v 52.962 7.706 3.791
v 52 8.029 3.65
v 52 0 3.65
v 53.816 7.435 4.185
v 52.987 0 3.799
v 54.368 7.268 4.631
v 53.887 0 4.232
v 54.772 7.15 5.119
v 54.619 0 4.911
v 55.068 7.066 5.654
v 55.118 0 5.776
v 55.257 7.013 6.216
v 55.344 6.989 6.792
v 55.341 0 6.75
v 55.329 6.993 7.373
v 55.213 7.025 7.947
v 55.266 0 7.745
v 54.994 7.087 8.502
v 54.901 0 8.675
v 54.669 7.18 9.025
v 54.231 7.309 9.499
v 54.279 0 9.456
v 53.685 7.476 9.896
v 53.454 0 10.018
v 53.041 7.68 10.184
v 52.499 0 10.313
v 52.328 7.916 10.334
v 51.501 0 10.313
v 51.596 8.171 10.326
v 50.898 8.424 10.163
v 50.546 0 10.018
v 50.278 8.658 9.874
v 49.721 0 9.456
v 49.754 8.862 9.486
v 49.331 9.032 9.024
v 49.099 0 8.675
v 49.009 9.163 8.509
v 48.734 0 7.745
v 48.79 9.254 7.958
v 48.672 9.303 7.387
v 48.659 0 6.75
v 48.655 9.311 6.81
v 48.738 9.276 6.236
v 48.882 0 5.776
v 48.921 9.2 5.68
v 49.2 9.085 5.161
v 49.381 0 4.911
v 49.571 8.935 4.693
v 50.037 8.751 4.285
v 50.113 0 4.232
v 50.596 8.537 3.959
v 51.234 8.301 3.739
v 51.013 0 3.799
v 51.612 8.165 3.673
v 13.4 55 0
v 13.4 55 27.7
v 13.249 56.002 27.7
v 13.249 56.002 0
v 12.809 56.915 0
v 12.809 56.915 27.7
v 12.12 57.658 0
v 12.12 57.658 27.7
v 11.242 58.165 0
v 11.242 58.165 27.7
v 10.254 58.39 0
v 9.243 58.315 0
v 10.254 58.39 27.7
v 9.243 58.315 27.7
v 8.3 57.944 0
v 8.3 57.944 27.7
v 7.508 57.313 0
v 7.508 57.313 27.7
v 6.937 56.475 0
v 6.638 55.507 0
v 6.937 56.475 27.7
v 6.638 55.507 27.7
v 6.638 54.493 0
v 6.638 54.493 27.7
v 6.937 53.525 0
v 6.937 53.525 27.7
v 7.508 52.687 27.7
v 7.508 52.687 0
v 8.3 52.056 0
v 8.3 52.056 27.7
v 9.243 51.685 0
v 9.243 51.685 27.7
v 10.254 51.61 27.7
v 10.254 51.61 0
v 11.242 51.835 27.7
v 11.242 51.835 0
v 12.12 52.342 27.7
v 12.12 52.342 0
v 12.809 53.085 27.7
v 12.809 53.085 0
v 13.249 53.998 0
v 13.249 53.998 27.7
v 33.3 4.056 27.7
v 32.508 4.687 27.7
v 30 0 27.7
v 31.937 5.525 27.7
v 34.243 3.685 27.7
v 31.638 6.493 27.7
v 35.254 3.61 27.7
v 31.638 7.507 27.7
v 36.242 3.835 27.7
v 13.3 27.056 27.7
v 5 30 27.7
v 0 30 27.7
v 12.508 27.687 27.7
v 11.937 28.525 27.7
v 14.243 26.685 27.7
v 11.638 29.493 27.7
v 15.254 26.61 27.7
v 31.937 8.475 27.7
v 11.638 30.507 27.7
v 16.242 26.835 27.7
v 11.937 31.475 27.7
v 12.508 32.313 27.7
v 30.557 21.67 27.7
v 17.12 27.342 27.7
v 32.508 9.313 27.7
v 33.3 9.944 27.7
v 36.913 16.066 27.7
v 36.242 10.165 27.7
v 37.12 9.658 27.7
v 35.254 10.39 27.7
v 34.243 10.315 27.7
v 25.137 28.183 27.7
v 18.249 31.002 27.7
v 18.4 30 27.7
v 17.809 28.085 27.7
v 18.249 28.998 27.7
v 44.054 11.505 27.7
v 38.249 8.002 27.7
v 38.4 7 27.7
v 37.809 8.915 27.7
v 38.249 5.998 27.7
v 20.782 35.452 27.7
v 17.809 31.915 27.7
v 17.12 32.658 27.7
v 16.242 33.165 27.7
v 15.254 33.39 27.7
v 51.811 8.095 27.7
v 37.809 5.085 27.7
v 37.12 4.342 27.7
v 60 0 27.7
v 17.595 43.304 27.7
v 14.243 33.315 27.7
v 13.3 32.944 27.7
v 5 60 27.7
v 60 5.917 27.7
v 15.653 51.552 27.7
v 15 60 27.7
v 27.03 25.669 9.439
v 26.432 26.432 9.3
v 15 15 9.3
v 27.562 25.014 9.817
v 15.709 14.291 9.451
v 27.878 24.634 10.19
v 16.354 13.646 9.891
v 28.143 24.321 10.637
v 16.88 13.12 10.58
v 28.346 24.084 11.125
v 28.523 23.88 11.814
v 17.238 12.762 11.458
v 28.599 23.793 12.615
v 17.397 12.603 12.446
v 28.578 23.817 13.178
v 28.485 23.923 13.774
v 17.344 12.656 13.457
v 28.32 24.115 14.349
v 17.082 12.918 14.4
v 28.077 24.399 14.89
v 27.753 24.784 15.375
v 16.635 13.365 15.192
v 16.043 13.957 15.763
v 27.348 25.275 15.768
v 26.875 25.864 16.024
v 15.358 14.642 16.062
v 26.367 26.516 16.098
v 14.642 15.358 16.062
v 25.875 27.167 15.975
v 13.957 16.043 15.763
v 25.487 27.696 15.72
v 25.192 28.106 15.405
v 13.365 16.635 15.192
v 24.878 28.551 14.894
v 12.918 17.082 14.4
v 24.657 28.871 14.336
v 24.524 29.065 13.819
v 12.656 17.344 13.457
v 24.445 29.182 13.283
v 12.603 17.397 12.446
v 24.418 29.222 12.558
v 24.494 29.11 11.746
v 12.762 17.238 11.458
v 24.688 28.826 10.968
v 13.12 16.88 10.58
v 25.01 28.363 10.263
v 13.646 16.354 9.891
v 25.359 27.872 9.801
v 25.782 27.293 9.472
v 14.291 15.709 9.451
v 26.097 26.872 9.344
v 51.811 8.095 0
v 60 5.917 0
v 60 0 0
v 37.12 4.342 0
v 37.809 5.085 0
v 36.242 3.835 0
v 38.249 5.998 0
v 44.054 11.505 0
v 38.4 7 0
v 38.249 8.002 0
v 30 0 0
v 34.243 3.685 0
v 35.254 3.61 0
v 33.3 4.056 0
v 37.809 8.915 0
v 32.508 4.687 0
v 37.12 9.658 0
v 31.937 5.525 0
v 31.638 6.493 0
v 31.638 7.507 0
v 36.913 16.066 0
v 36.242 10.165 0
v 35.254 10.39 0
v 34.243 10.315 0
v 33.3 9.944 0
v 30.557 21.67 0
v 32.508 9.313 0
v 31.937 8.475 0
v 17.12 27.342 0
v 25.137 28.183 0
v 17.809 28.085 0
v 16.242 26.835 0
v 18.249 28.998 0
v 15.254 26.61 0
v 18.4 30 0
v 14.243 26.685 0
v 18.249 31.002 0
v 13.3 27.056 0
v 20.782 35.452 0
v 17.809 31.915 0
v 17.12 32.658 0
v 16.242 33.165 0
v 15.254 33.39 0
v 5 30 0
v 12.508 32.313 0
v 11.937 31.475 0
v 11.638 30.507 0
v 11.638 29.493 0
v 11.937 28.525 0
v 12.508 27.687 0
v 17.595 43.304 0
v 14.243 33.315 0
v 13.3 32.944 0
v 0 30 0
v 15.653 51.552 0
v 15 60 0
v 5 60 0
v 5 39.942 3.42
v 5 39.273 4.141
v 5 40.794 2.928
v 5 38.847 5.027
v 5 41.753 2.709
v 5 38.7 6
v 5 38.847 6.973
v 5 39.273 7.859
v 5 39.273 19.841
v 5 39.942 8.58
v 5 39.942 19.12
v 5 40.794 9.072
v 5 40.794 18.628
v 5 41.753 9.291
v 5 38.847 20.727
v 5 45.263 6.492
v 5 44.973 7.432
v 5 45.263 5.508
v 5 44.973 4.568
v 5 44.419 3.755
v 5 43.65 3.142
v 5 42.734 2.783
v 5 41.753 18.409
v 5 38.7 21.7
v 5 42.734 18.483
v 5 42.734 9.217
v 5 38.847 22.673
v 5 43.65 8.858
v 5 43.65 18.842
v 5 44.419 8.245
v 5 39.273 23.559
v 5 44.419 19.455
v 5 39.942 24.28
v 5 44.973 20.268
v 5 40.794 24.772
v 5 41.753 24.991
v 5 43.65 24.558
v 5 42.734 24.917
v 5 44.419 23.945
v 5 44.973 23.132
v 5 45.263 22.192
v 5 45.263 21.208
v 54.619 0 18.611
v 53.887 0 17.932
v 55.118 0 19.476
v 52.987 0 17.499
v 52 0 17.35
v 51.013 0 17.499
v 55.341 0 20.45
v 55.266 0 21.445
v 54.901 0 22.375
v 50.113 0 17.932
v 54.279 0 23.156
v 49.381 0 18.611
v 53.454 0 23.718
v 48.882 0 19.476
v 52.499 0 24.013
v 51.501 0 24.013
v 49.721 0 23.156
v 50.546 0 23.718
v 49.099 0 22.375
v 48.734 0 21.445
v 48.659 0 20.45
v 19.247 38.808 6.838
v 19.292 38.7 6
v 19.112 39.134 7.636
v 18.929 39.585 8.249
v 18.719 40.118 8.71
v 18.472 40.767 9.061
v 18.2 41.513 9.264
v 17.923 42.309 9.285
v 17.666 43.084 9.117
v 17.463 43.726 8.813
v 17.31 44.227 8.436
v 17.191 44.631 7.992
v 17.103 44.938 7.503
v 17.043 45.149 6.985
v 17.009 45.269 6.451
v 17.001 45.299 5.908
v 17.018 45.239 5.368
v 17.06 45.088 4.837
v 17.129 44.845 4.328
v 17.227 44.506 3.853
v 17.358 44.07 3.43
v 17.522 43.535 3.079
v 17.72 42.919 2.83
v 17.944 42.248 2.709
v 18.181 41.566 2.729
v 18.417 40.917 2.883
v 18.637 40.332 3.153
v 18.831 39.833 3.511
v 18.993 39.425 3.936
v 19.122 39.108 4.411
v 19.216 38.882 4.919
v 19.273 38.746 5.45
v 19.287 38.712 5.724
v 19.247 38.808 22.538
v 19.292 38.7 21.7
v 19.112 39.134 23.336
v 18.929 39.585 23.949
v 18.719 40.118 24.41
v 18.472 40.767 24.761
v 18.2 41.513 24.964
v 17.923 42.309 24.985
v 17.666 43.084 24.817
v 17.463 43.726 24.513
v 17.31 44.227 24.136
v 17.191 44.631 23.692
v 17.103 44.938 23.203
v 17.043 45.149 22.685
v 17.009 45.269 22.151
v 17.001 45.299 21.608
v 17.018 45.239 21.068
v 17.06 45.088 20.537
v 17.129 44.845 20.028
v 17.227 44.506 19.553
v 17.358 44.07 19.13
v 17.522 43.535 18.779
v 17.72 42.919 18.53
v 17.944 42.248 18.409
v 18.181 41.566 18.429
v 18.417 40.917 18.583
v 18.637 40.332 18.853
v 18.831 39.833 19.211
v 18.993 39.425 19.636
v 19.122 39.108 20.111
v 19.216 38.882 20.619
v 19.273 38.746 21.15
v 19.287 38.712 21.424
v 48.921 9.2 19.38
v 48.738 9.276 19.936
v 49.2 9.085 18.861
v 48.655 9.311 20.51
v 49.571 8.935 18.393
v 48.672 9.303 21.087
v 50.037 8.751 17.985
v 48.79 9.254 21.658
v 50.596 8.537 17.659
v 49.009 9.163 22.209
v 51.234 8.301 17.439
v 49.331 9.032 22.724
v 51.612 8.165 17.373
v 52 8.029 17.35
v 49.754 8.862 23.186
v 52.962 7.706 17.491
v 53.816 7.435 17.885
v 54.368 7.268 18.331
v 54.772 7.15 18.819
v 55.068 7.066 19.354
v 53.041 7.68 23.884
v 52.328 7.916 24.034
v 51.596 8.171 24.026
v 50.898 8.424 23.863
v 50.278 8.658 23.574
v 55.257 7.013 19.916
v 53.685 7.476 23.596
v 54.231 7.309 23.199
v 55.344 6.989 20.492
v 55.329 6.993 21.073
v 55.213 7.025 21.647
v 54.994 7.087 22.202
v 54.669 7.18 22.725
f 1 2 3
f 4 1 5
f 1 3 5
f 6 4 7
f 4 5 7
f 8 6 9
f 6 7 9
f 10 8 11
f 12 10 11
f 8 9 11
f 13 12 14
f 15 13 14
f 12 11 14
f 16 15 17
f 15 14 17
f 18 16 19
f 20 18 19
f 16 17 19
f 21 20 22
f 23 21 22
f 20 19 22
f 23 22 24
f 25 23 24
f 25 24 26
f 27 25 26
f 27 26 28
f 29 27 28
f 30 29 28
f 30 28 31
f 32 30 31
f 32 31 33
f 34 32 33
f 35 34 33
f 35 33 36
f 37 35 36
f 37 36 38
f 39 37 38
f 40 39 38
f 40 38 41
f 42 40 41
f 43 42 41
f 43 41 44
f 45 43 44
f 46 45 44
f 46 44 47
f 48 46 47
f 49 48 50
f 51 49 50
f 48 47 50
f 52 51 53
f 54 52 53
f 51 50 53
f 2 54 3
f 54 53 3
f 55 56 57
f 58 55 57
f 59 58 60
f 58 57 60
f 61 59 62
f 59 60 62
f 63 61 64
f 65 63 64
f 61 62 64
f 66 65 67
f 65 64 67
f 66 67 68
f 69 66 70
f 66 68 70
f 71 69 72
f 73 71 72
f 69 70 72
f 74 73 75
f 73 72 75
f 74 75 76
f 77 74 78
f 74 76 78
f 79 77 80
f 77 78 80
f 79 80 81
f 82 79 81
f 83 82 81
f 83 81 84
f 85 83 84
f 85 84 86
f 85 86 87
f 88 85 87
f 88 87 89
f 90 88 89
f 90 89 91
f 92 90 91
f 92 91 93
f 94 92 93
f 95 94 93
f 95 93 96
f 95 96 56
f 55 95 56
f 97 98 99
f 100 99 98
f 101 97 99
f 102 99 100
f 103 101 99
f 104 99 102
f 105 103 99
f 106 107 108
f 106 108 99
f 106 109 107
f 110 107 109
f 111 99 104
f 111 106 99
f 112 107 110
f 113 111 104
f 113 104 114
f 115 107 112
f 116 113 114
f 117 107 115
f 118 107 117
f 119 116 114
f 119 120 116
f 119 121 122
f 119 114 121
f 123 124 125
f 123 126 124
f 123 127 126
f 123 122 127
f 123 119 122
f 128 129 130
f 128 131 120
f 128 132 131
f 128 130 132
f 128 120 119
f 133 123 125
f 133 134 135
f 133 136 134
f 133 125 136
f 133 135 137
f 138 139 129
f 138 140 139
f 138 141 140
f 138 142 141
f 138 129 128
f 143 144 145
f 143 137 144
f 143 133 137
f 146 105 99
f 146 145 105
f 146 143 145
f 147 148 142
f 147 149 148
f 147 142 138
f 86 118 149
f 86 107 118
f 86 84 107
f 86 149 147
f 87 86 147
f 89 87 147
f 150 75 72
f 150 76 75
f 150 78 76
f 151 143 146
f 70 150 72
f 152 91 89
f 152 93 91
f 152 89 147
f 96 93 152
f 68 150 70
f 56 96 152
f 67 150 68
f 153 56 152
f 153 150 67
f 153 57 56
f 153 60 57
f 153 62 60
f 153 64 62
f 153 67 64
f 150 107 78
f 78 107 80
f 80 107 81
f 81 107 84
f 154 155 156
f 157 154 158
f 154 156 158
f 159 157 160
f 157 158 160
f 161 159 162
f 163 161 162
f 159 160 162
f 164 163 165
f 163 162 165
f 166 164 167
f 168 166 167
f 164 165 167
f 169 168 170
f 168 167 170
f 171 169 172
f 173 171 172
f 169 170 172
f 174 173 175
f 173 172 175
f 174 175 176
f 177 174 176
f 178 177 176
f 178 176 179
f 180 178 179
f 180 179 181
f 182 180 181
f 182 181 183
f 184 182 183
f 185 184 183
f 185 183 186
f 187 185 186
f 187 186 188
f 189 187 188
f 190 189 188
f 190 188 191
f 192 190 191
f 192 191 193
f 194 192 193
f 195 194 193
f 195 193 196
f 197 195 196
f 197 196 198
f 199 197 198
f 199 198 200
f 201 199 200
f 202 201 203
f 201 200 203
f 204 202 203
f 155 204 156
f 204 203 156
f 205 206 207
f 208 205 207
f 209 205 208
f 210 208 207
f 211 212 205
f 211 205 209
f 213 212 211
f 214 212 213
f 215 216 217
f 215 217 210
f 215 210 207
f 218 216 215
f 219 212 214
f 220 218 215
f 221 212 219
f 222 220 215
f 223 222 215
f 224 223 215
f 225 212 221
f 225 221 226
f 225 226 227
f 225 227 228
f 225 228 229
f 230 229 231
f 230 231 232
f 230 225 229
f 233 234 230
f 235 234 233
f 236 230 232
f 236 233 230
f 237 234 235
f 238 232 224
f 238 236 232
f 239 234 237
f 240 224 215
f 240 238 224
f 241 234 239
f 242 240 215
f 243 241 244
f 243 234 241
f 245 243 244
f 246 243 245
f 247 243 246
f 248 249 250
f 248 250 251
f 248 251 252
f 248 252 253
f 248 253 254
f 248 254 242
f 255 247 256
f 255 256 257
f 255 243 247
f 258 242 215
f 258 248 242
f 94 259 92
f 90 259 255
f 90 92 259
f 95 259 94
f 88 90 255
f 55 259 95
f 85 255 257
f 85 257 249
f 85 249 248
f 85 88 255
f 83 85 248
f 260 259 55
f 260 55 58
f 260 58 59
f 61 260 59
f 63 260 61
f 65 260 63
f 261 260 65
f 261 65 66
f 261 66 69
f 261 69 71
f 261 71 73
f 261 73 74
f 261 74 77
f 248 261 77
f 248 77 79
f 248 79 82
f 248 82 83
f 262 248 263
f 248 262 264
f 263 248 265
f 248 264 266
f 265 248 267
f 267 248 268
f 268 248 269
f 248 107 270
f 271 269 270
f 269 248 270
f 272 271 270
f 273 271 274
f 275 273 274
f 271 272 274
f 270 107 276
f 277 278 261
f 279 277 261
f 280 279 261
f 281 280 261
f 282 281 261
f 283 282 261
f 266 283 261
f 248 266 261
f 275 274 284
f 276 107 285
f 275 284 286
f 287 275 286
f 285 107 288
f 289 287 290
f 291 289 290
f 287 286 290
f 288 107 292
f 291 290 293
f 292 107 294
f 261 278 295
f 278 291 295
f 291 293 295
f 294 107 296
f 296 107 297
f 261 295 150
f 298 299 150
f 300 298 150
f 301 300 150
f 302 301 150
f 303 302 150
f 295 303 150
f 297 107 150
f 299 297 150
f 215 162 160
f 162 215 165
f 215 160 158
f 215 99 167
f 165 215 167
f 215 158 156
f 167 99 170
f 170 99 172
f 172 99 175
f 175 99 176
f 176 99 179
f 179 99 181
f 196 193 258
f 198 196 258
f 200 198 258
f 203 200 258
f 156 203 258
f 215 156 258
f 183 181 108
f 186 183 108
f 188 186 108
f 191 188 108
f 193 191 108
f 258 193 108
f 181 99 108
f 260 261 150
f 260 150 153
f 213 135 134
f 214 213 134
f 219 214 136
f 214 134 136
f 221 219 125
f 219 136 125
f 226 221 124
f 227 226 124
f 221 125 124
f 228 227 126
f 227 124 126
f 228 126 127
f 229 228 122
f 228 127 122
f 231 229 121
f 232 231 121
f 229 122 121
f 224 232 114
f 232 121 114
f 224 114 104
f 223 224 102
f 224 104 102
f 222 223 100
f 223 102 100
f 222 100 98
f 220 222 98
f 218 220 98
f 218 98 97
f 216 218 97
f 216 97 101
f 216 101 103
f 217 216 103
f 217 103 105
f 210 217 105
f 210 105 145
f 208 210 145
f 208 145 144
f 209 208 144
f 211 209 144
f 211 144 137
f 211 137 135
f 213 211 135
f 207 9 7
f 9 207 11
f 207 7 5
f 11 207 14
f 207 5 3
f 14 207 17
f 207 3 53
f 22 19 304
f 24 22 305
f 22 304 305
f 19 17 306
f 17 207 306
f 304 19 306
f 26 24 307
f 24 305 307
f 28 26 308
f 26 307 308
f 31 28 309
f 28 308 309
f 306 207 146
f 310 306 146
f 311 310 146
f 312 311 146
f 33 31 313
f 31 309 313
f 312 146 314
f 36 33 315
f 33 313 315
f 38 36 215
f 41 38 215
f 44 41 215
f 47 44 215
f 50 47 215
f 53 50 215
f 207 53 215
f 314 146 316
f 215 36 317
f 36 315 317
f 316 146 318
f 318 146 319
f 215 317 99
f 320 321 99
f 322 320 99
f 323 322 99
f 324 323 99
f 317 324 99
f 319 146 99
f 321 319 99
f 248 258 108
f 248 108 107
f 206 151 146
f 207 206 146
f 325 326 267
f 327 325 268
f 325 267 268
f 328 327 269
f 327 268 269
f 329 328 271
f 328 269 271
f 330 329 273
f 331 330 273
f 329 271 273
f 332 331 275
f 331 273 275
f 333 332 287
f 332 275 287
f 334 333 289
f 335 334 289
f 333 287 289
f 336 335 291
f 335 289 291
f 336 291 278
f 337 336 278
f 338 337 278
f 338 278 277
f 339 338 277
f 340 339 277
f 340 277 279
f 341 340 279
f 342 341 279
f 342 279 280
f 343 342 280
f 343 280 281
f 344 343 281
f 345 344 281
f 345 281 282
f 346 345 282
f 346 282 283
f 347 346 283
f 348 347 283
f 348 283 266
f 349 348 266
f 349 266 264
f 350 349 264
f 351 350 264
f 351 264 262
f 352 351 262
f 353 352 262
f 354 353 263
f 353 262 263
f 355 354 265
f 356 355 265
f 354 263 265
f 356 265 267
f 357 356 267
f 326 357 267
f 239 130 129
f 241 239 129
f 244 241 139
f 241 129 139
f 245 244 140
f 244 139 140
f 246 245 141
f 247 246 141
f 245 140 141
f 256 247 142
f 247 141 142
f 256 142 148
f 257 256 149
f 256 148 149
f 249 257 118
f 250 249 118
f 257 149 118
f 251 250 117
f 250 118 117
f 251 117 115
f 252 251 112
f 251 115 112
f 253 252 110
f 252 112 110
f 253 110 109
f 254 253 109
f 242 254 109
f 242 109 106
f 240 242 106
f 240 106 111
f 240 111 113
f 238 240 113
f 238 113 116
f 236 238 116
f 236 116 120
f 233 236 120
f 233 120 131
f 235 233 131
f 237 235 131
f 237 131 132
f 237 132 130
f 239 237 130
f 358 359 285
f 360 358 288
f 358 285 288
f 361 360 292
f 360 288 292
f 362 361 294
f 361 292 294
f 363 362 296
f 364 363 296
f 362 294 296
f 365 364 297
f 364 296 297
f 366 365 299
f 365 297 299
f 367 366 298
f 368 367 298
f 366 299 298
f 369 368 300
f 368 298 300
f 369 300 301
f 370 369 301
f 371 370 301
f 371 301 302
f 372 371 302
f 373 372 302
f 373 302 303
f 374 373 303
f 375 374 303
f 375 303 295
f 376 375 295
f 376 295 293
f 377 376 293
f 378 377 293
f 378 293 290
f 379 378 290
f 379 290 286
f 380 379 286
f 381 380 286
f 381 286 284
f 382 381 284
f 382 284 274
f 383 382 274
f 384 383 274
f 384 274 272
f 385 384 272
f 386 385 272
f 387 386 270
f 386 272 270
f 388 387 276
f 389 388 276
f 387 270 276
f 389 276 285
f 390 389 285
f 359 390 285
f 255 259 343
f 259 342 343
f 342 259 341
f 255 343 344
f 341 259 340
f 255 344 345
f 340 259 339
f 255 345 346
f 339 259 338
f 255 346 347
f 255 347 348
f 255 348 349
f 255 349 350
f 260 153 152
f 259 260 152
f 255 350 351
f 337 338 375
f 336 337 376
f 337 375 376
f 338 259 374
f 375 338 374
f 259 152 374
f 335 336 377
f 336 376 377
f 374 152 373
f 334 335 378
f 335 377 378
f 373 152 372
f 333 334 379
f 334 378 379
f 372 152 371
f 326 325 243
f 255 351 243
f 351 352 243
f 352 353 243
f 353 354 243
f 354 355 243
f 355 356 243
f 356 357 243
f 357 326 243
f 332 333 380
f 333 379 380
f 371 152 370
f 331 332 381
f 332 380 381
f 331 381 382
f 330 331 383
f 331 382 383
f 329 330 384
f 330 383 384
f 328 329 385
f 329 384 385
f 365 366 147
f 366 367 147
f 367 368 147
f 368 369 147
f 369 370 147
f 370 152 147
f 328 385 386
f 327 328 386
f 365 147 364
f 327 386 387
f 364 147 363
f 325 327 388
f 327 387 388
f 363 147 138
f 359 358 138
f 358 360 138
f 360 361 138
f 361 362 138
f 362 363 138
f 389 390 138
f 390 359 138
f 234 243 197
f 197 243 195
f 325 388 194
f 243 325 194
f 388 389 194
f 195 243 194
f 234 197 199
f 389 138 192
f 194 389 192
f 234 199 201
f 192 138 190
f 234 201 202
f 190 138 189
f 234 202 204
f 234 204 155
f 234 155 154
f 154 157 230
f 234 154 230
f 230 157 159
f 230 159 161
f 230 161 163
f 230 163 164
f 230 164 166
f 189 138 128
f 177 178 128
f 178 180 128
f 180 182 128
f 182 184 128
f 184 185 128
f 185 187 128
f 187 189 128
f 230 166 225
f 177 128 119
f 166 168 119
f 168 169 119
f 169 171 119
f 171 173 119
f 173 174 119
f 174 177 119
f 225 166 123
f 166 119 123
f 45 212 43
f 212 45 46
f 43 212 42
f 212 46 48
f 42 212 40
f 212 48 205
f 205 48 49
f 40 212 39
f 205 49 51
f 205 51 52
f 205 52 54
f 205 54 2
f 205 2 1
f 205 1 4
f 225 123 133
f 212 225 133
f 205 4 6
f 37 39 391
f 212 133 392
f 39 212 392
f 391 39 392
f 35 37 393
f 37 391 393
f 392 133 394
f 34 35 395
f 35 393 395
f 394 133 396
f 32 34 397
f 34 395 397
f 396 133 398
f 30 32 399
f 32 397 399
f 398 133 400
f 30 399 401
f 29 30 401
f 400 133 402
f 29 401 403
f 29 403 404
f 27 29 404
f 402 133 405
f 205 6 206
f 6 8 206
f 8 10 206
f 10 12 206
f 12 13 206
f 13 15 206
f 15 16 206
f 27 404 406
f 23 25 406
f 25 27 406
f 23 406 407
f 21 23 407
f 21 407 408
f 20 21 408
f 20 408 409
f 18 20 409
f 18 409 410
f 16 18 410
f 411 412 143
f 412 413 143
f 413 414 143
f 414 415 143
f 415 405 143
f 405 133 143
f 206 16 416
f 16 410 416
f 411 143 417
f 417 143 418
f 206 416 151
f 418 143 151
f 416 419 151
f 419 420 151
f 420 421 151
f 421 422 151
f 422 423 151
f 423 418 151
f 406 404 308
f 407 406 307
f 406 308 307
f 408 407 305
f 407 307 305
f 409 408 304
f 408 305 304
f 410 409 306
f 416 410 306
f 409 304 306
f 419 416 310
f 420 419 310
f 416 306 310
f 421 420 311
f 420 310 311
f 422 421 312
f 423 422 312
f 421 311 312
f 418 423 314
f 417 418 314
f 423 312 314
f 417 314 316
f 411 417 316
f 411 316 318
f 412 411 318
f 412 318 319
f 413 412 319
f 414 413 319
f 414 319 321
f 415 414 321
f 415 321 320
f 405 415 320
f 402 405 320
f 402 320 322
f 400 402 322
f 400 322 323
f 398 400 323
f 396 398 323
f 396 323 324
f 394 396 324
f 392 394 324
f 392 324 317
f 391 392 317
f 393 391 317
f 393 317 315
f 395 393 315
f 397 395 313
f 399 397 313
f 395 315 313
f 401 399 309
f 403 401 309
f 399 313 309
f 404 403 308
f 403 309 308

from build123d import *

# Parameters (mm, degrees)
SKETCH_1_W          = 30
SKETCH_1_H          = 30
SKETCH_1_W_2        = 25
EXTRUDE_1_DEPTH     = 27.7
SKETCH_3_R          = 55
CUT_EXTRUDE_1_DEPTH = 40
SKETCH_4_R          = 3.4
CUT_EXTRUDE_2_DEPTH = 90.259677346
SKETCH_5_R          = 3.3
CUT_EXTRUDE_3_DEPTH = 86.978427527
SKETCH_6_R          = 3.35
CUT_EXTRUDE_4_DEPTH = 90.259677512
EXTRUDE_2_DEPTH     = 50
SKETCH_8_R          = 3.4
CUT_EXTRUDE_5_DEPTH = 50
CUT_EXTRUDE_START   = -50
CUT_EXTRUDE_6_DEPTH = 50


with BuildPart() as part:
    # 草图1 → 凸台-拉伸1 (new body)
    with BuildSketch(Plane.XY):
        Polygon((0, 30), (30, 0), (30, 30), align=None)
        with Locations((45, 15)):
            Rectangle(SKETCH_1_W, SKETCH_1_H)
        with Locations((17.5, 45)):
            Rectangle(SKETCH_1_W_2, SKETCH_1_H)
    extrude(amount=EXTRUDE_1_DEPTH)

    # 草图3 → 切除-拉伸1 (cut)
    with BuildSketch(Plane.XY.offset(27.7)):
        with Locations((70, 60)):
            Circle(SKETCH_3_R)
    extrude(amount=-CUT_EXTRUDE_1_DEPTH, mode=Mode.SUBTRACT)

    # 草图4 → 切除-拉伸2 (cut, through all)
    with BuildSketch(Plane.XY.offset(27.7)):
        with Locations((35, 7)):
            Circle(SKETCH_4_R)
        with Locations((10, 55)):
            Circle(SKETCH_4_R)
        with Locations((15, 30)):
            Circle(SKETCH_4_R)
    extrude(amount=-CUT_EXTRUDE_2_DEPTH, mode=Mode.SUBTRACT)

    # 草图5 → 切除-拉伸3 (cut, through all)
    with BuildSketch(Plane.ZY.offset(-5)):
        with Locations(Location((6, 42, 0), (0, 0, 270))):
            Circle(SKETCH_5_R)
        with Locations(Location((21.7, 42, 0), (0, 0, 270))):
            Circle(SKETCH_5_R)
    extrude(amount=-CUT_EXTRUDE_3_DEPTH, mode=Mode.SUBTRACT)

    # 草图6 → 切除-拉伸4 (cut, through all)
    with BuildSketch(Plane.XZ):
        with Locations(Location((52, 20.7, 0), (0, 0, 270))):
            Circle(SKETCH_6_R)
        with Locations(Location((52, 7, 0), (0, 0, 270))):
            Circle(SKETCH_6_R)
    extrude(amount=-CUT_EXTRUDE_4_DEPTH, mode=Mode.SUBTRACT)

    # 草图7 → 凸台-拉伸2 (add)
    with BuildSketch(Plane(origin=(0, 0, 0), x_dir=(-1, 0, 0), z_dir=(0, 0, -1))):
        with BuildLine():
            Line((-5, 60), (-15, 60))
            ThreePointArc((-15, 60), (-27.721163687, 24.821881801), (-60, 5.916730868))
            Line((-60, 5.916730868), (-60, 0))
            Line((-60, 0), (-30, 0))
            Line((-30, 0), (0, 30))
            Line((0, 30), (-5, 30))
            Line((-5, 30), (-5, 60))
        make_face()
    extrude(amount=EXTRUDE_2_DEPTH)

    # 草图8 → 切除-拉伸5 (cut)
    with BuildSketch(Plane(origin=(15, 15, 0), x_dir=(0, 0, 1), z_dir=(-0.7071067811865477, -0.7071067811865475, 0))):
        with BuildLine():
            ThreePointArc((16.1, 0), (12.7, 3.4), (9.3, 0))
            Line((9.3, 0), (16.1, 0))
        make_face()
        with BuildLine():
            Line((16.1, 0), (9.3, 0))
            ThreePointArc((9.3, 0), (12.7, -3.4), (16.1, 0))
        make_face()
        with Locations(Location((-40, 10, 0), (0, 0, 270))):
            Circle(SKETCH_8_R)
        with Locations(Location((-20, 10, 0), (0, 0, 270))):
            Circle(SKETCH_8_R)
        with Locations(Location((-40, -10, 0), (0, 0, 270))):
            Circle(SKETCH_8_R)
        with Locations(Location((-20, -10, 0), (0, 0, 270))):
            Circle(SKETCH_8_R)
    extrude(amount=-CUT_EXTRUDE_5_DEPTH, mode=Mode.SUBTRACT)

    # 草图9 → 切除-拉伸6 (cut)
    with BuildSketch(Plane(origin=(0, 0, -50), x_dir=(-1, 0, 0), z_dir=(0, 0, -1)).offset(CUT_EXTRUDE_START)):
        with BuildLine():
            Line((-5, 30), (-5, 60))
            Line((-5, 60), (-15, 60))
            ThreePointArc((-15, 60), (-27.721163687, 24.821881801), (-60, 5.916730868))
            Line((-60, 5.916730868), (-60, 0))
            Line((-60, 0), (-30, 0))
            Line((-30, 0), (0, 30))
            Line((0, 30), (-5, 30))
        make_face()
    extrude(amount=CUT_EXTRUDE_6_DEPTH, mode=Mode.SUBTRACT)


solid = part.part
